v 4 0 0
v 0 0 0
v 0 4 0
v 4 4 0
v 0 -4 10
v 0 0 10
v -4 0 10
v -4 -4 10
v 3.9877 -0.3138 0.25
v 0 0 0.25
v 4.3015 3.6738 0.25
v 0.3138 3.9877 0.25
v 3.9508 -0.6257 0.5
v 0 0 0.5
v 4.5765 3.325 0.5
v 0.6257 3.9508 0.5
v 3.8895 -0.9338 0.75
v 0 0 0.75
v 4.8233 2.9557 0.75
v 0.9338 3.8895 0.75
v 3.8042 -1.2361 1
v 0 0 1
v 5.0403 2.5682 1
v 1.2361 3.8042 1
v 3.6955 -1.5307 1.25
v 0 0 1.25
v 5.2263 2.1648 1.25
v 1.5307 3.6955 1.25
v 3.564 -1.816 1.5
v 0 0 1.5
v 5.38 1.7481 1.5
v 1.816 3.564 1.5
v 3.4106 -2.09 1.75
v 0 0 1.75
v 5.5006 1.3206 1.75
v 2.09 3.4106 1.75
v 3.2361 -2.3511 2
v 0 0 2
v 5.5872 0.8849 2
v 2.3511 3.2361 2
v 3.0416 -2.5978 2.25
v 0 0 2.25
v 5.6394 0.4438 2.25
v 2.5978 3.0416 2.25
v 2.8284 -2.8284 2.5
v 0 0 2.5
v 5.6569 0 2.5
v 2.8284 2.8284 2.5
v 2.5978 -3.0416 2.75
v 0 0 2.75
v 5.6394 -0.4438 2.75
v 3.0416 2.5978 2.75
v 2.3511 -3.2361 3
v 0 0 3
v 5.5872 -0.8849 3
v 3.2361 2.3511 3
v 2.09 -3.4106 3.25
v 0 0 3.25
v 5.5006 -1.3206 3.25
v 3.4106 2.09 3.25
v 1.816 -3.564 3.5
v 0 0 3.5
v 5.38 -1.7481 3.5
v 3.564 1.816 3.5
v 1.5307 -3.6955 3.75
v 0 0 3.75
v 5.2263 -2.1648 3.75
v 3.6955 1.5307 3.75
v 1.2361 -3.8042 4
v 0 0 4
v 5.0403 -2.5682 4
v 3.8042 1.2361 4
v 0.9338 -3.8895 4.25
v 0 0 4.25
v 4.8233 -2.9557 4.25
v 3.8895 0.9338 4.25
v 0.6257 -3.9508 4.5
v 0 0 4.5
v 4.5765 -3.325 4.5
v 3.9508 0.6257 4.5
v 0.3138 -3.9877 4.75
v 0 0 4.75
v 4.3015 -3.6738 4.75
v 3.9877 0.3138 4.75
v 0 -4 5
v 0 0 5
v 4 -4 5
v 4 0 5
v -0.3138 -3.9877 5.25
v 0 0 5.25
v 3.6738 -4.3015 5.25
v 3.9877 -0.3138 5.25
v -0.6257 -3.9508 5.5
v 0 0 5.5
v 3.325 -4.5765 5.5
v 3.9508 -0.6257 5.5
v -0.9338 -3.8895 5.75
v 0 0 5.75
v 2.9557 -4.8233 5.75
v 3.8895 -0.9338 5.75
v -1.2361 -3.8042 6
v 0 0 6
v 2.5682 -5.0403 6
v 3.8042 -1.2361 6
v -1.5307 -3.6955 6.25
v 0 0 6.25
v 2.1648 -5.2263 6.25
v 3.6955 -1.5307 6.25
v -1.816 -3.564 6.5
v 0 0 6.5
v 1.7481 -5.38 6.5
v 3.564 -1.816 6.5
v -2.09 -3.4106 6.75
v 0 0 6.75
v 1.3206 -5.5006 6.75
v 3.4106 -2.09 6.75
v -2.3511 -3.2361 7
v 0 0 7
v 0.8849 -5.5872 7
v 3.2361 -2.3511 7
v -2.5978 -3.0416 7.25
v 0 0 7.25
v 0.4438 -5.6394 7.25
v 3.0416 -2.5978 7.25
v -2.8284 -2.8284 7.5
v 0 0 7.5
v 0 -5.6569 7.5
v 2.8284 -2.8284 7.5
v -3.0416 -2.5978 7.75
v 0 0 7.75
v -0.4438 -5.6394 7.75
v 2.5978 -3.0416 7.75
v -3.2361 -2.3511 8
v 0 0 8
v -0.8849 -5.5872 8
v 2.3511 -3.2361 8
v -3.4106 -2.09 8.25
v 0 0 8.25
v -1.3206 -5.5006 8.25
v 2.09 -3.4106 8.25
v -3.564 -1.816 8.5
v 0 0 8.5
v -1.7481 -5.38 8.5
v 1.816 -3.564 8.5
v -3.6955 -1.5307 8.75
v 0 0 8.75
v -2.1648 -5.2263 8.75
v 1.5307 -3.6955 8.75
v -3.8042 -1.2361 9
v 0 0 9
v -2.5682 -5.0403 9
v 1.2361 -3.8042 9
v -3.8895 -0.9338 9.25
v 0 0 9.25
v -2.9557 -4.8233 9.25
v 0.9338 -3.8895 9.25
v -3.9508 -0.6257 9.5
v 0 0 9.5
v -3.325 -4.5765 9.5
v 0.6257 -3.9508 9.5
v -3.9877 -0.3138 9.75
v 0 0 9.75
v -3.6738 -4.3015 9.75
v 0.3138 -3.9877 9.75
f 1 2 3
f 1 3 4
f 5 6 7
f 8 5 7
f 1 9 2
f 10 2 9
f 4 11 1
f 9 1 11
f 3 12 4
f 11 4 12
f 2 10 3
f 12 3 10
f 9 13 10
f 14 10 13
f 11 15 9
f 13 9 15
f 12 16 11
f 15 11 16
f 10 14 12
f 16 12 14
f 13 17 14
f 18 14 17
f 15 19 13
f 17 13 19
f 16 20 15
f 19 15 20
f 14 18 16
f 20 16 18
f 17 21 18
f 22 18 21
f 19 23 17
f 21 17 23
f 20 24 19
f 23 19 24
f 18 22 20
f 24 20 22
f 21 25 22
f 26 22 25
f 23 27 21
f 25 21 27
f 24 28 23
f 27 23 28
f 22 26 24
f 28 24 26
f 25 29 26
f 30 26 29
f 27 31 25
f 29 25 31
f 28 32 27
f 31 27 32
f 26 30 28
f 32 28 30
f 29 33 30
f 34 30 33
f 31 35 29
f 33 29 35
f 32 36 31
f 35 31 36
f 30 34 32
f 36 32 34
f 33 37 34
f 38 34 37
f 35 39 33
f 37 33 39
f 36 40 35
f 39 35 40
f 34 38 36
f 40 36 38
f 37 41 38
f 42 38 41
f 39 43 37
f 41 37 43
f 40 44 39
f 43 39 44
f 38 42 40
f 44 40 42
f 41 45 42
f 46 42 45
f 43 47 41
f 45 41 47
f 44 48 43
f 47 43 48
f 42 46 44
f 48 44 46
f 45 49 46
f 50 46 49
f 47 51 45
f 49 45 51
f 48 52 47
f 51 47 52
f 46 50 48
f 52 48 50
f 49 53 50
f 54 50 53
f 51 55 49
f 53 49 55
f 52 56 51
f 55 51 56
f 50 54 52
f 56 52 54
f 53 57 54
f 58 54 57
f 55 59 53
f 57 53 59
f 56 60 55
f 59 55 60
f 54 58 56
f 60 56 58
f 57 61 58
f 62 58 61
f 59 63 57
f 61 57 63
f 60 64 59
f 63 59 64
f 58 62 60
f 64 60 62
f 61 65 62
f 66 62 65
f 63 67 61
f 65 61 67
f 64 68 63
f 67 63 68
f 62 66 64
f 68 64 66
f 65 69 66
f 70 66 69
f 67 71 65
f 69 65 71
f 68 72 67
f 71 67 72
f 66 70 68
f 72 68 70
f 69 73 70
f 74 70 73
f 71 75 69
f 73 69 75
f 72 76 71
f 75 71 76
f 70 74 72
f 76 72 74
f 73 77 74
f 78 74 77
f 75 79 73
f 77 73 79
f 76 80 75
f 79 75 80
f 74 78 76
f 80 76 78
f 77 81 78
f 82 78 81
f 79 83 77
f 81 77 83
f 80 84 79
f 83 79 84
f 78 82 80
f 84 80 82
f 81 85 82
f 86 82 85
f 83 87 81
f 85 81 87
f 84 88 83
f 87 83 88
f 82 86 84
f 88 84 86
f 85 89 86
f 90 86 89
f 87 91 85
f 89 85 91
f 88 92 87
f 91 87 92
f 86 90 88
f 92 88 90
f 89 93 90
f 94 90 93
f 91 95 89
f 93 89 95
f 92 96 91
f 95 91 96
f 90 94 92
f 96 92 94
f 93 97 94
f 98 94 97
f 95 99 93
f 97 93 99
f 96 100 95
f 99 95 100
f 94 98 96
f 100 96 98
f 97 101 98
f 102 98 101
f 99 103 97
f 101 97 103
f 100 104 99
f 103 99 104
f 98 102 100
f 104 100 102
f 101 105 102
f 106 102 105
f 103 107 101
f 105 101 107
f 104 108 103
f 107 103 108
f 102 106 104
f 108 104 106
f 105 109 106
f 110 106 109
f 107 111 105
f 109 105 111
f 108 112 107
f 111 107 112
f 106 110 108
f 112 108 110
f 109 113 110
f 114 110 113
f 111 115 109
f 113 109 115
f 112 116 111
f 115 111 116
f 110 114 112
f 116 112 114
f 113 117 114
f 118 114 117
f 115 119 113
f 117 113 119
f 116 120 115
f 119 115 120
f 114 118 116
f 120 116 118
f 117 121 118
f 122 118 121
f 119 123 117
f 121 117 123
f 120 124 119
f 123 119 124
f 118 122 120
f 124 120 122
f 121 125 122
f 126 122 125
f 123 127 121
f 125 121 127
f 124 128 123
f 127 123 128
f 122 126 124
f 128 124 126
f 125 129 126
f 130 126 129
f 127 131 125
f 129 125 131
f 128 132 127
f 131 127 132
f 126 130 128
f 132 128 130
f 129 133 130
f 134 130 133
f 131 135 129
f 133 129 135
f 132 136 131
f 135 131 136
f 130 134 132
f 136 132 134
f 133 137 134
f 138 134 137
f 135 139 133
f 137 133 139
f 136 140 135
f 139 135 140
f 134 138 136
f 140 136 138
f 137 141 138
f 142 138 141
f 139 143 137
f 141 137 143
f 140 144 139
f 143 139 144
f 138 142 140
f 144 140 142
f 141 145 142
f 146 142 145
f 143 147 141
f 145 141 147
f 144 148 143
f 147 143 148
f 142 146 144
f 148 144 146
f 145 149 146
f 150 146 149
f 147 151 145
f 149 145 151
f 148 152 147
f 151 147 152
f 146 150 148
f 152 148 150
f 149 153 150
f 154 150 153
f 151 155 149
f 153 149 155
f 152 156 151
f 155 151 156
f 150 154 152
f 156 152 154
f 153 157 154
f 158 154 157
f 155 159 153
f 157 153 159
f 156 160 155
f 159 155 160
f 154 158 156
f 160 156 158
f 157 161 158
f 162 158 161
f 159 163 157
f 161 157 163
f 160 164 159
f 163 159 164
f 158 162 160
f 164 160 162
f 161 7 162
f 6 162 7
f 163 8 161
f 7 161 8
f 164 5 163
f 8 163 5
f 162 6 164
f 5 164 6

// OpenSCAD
$fn = 32;
linear_extrude(height = 10, twist = 180, slices = 40) square([4, 4]);
